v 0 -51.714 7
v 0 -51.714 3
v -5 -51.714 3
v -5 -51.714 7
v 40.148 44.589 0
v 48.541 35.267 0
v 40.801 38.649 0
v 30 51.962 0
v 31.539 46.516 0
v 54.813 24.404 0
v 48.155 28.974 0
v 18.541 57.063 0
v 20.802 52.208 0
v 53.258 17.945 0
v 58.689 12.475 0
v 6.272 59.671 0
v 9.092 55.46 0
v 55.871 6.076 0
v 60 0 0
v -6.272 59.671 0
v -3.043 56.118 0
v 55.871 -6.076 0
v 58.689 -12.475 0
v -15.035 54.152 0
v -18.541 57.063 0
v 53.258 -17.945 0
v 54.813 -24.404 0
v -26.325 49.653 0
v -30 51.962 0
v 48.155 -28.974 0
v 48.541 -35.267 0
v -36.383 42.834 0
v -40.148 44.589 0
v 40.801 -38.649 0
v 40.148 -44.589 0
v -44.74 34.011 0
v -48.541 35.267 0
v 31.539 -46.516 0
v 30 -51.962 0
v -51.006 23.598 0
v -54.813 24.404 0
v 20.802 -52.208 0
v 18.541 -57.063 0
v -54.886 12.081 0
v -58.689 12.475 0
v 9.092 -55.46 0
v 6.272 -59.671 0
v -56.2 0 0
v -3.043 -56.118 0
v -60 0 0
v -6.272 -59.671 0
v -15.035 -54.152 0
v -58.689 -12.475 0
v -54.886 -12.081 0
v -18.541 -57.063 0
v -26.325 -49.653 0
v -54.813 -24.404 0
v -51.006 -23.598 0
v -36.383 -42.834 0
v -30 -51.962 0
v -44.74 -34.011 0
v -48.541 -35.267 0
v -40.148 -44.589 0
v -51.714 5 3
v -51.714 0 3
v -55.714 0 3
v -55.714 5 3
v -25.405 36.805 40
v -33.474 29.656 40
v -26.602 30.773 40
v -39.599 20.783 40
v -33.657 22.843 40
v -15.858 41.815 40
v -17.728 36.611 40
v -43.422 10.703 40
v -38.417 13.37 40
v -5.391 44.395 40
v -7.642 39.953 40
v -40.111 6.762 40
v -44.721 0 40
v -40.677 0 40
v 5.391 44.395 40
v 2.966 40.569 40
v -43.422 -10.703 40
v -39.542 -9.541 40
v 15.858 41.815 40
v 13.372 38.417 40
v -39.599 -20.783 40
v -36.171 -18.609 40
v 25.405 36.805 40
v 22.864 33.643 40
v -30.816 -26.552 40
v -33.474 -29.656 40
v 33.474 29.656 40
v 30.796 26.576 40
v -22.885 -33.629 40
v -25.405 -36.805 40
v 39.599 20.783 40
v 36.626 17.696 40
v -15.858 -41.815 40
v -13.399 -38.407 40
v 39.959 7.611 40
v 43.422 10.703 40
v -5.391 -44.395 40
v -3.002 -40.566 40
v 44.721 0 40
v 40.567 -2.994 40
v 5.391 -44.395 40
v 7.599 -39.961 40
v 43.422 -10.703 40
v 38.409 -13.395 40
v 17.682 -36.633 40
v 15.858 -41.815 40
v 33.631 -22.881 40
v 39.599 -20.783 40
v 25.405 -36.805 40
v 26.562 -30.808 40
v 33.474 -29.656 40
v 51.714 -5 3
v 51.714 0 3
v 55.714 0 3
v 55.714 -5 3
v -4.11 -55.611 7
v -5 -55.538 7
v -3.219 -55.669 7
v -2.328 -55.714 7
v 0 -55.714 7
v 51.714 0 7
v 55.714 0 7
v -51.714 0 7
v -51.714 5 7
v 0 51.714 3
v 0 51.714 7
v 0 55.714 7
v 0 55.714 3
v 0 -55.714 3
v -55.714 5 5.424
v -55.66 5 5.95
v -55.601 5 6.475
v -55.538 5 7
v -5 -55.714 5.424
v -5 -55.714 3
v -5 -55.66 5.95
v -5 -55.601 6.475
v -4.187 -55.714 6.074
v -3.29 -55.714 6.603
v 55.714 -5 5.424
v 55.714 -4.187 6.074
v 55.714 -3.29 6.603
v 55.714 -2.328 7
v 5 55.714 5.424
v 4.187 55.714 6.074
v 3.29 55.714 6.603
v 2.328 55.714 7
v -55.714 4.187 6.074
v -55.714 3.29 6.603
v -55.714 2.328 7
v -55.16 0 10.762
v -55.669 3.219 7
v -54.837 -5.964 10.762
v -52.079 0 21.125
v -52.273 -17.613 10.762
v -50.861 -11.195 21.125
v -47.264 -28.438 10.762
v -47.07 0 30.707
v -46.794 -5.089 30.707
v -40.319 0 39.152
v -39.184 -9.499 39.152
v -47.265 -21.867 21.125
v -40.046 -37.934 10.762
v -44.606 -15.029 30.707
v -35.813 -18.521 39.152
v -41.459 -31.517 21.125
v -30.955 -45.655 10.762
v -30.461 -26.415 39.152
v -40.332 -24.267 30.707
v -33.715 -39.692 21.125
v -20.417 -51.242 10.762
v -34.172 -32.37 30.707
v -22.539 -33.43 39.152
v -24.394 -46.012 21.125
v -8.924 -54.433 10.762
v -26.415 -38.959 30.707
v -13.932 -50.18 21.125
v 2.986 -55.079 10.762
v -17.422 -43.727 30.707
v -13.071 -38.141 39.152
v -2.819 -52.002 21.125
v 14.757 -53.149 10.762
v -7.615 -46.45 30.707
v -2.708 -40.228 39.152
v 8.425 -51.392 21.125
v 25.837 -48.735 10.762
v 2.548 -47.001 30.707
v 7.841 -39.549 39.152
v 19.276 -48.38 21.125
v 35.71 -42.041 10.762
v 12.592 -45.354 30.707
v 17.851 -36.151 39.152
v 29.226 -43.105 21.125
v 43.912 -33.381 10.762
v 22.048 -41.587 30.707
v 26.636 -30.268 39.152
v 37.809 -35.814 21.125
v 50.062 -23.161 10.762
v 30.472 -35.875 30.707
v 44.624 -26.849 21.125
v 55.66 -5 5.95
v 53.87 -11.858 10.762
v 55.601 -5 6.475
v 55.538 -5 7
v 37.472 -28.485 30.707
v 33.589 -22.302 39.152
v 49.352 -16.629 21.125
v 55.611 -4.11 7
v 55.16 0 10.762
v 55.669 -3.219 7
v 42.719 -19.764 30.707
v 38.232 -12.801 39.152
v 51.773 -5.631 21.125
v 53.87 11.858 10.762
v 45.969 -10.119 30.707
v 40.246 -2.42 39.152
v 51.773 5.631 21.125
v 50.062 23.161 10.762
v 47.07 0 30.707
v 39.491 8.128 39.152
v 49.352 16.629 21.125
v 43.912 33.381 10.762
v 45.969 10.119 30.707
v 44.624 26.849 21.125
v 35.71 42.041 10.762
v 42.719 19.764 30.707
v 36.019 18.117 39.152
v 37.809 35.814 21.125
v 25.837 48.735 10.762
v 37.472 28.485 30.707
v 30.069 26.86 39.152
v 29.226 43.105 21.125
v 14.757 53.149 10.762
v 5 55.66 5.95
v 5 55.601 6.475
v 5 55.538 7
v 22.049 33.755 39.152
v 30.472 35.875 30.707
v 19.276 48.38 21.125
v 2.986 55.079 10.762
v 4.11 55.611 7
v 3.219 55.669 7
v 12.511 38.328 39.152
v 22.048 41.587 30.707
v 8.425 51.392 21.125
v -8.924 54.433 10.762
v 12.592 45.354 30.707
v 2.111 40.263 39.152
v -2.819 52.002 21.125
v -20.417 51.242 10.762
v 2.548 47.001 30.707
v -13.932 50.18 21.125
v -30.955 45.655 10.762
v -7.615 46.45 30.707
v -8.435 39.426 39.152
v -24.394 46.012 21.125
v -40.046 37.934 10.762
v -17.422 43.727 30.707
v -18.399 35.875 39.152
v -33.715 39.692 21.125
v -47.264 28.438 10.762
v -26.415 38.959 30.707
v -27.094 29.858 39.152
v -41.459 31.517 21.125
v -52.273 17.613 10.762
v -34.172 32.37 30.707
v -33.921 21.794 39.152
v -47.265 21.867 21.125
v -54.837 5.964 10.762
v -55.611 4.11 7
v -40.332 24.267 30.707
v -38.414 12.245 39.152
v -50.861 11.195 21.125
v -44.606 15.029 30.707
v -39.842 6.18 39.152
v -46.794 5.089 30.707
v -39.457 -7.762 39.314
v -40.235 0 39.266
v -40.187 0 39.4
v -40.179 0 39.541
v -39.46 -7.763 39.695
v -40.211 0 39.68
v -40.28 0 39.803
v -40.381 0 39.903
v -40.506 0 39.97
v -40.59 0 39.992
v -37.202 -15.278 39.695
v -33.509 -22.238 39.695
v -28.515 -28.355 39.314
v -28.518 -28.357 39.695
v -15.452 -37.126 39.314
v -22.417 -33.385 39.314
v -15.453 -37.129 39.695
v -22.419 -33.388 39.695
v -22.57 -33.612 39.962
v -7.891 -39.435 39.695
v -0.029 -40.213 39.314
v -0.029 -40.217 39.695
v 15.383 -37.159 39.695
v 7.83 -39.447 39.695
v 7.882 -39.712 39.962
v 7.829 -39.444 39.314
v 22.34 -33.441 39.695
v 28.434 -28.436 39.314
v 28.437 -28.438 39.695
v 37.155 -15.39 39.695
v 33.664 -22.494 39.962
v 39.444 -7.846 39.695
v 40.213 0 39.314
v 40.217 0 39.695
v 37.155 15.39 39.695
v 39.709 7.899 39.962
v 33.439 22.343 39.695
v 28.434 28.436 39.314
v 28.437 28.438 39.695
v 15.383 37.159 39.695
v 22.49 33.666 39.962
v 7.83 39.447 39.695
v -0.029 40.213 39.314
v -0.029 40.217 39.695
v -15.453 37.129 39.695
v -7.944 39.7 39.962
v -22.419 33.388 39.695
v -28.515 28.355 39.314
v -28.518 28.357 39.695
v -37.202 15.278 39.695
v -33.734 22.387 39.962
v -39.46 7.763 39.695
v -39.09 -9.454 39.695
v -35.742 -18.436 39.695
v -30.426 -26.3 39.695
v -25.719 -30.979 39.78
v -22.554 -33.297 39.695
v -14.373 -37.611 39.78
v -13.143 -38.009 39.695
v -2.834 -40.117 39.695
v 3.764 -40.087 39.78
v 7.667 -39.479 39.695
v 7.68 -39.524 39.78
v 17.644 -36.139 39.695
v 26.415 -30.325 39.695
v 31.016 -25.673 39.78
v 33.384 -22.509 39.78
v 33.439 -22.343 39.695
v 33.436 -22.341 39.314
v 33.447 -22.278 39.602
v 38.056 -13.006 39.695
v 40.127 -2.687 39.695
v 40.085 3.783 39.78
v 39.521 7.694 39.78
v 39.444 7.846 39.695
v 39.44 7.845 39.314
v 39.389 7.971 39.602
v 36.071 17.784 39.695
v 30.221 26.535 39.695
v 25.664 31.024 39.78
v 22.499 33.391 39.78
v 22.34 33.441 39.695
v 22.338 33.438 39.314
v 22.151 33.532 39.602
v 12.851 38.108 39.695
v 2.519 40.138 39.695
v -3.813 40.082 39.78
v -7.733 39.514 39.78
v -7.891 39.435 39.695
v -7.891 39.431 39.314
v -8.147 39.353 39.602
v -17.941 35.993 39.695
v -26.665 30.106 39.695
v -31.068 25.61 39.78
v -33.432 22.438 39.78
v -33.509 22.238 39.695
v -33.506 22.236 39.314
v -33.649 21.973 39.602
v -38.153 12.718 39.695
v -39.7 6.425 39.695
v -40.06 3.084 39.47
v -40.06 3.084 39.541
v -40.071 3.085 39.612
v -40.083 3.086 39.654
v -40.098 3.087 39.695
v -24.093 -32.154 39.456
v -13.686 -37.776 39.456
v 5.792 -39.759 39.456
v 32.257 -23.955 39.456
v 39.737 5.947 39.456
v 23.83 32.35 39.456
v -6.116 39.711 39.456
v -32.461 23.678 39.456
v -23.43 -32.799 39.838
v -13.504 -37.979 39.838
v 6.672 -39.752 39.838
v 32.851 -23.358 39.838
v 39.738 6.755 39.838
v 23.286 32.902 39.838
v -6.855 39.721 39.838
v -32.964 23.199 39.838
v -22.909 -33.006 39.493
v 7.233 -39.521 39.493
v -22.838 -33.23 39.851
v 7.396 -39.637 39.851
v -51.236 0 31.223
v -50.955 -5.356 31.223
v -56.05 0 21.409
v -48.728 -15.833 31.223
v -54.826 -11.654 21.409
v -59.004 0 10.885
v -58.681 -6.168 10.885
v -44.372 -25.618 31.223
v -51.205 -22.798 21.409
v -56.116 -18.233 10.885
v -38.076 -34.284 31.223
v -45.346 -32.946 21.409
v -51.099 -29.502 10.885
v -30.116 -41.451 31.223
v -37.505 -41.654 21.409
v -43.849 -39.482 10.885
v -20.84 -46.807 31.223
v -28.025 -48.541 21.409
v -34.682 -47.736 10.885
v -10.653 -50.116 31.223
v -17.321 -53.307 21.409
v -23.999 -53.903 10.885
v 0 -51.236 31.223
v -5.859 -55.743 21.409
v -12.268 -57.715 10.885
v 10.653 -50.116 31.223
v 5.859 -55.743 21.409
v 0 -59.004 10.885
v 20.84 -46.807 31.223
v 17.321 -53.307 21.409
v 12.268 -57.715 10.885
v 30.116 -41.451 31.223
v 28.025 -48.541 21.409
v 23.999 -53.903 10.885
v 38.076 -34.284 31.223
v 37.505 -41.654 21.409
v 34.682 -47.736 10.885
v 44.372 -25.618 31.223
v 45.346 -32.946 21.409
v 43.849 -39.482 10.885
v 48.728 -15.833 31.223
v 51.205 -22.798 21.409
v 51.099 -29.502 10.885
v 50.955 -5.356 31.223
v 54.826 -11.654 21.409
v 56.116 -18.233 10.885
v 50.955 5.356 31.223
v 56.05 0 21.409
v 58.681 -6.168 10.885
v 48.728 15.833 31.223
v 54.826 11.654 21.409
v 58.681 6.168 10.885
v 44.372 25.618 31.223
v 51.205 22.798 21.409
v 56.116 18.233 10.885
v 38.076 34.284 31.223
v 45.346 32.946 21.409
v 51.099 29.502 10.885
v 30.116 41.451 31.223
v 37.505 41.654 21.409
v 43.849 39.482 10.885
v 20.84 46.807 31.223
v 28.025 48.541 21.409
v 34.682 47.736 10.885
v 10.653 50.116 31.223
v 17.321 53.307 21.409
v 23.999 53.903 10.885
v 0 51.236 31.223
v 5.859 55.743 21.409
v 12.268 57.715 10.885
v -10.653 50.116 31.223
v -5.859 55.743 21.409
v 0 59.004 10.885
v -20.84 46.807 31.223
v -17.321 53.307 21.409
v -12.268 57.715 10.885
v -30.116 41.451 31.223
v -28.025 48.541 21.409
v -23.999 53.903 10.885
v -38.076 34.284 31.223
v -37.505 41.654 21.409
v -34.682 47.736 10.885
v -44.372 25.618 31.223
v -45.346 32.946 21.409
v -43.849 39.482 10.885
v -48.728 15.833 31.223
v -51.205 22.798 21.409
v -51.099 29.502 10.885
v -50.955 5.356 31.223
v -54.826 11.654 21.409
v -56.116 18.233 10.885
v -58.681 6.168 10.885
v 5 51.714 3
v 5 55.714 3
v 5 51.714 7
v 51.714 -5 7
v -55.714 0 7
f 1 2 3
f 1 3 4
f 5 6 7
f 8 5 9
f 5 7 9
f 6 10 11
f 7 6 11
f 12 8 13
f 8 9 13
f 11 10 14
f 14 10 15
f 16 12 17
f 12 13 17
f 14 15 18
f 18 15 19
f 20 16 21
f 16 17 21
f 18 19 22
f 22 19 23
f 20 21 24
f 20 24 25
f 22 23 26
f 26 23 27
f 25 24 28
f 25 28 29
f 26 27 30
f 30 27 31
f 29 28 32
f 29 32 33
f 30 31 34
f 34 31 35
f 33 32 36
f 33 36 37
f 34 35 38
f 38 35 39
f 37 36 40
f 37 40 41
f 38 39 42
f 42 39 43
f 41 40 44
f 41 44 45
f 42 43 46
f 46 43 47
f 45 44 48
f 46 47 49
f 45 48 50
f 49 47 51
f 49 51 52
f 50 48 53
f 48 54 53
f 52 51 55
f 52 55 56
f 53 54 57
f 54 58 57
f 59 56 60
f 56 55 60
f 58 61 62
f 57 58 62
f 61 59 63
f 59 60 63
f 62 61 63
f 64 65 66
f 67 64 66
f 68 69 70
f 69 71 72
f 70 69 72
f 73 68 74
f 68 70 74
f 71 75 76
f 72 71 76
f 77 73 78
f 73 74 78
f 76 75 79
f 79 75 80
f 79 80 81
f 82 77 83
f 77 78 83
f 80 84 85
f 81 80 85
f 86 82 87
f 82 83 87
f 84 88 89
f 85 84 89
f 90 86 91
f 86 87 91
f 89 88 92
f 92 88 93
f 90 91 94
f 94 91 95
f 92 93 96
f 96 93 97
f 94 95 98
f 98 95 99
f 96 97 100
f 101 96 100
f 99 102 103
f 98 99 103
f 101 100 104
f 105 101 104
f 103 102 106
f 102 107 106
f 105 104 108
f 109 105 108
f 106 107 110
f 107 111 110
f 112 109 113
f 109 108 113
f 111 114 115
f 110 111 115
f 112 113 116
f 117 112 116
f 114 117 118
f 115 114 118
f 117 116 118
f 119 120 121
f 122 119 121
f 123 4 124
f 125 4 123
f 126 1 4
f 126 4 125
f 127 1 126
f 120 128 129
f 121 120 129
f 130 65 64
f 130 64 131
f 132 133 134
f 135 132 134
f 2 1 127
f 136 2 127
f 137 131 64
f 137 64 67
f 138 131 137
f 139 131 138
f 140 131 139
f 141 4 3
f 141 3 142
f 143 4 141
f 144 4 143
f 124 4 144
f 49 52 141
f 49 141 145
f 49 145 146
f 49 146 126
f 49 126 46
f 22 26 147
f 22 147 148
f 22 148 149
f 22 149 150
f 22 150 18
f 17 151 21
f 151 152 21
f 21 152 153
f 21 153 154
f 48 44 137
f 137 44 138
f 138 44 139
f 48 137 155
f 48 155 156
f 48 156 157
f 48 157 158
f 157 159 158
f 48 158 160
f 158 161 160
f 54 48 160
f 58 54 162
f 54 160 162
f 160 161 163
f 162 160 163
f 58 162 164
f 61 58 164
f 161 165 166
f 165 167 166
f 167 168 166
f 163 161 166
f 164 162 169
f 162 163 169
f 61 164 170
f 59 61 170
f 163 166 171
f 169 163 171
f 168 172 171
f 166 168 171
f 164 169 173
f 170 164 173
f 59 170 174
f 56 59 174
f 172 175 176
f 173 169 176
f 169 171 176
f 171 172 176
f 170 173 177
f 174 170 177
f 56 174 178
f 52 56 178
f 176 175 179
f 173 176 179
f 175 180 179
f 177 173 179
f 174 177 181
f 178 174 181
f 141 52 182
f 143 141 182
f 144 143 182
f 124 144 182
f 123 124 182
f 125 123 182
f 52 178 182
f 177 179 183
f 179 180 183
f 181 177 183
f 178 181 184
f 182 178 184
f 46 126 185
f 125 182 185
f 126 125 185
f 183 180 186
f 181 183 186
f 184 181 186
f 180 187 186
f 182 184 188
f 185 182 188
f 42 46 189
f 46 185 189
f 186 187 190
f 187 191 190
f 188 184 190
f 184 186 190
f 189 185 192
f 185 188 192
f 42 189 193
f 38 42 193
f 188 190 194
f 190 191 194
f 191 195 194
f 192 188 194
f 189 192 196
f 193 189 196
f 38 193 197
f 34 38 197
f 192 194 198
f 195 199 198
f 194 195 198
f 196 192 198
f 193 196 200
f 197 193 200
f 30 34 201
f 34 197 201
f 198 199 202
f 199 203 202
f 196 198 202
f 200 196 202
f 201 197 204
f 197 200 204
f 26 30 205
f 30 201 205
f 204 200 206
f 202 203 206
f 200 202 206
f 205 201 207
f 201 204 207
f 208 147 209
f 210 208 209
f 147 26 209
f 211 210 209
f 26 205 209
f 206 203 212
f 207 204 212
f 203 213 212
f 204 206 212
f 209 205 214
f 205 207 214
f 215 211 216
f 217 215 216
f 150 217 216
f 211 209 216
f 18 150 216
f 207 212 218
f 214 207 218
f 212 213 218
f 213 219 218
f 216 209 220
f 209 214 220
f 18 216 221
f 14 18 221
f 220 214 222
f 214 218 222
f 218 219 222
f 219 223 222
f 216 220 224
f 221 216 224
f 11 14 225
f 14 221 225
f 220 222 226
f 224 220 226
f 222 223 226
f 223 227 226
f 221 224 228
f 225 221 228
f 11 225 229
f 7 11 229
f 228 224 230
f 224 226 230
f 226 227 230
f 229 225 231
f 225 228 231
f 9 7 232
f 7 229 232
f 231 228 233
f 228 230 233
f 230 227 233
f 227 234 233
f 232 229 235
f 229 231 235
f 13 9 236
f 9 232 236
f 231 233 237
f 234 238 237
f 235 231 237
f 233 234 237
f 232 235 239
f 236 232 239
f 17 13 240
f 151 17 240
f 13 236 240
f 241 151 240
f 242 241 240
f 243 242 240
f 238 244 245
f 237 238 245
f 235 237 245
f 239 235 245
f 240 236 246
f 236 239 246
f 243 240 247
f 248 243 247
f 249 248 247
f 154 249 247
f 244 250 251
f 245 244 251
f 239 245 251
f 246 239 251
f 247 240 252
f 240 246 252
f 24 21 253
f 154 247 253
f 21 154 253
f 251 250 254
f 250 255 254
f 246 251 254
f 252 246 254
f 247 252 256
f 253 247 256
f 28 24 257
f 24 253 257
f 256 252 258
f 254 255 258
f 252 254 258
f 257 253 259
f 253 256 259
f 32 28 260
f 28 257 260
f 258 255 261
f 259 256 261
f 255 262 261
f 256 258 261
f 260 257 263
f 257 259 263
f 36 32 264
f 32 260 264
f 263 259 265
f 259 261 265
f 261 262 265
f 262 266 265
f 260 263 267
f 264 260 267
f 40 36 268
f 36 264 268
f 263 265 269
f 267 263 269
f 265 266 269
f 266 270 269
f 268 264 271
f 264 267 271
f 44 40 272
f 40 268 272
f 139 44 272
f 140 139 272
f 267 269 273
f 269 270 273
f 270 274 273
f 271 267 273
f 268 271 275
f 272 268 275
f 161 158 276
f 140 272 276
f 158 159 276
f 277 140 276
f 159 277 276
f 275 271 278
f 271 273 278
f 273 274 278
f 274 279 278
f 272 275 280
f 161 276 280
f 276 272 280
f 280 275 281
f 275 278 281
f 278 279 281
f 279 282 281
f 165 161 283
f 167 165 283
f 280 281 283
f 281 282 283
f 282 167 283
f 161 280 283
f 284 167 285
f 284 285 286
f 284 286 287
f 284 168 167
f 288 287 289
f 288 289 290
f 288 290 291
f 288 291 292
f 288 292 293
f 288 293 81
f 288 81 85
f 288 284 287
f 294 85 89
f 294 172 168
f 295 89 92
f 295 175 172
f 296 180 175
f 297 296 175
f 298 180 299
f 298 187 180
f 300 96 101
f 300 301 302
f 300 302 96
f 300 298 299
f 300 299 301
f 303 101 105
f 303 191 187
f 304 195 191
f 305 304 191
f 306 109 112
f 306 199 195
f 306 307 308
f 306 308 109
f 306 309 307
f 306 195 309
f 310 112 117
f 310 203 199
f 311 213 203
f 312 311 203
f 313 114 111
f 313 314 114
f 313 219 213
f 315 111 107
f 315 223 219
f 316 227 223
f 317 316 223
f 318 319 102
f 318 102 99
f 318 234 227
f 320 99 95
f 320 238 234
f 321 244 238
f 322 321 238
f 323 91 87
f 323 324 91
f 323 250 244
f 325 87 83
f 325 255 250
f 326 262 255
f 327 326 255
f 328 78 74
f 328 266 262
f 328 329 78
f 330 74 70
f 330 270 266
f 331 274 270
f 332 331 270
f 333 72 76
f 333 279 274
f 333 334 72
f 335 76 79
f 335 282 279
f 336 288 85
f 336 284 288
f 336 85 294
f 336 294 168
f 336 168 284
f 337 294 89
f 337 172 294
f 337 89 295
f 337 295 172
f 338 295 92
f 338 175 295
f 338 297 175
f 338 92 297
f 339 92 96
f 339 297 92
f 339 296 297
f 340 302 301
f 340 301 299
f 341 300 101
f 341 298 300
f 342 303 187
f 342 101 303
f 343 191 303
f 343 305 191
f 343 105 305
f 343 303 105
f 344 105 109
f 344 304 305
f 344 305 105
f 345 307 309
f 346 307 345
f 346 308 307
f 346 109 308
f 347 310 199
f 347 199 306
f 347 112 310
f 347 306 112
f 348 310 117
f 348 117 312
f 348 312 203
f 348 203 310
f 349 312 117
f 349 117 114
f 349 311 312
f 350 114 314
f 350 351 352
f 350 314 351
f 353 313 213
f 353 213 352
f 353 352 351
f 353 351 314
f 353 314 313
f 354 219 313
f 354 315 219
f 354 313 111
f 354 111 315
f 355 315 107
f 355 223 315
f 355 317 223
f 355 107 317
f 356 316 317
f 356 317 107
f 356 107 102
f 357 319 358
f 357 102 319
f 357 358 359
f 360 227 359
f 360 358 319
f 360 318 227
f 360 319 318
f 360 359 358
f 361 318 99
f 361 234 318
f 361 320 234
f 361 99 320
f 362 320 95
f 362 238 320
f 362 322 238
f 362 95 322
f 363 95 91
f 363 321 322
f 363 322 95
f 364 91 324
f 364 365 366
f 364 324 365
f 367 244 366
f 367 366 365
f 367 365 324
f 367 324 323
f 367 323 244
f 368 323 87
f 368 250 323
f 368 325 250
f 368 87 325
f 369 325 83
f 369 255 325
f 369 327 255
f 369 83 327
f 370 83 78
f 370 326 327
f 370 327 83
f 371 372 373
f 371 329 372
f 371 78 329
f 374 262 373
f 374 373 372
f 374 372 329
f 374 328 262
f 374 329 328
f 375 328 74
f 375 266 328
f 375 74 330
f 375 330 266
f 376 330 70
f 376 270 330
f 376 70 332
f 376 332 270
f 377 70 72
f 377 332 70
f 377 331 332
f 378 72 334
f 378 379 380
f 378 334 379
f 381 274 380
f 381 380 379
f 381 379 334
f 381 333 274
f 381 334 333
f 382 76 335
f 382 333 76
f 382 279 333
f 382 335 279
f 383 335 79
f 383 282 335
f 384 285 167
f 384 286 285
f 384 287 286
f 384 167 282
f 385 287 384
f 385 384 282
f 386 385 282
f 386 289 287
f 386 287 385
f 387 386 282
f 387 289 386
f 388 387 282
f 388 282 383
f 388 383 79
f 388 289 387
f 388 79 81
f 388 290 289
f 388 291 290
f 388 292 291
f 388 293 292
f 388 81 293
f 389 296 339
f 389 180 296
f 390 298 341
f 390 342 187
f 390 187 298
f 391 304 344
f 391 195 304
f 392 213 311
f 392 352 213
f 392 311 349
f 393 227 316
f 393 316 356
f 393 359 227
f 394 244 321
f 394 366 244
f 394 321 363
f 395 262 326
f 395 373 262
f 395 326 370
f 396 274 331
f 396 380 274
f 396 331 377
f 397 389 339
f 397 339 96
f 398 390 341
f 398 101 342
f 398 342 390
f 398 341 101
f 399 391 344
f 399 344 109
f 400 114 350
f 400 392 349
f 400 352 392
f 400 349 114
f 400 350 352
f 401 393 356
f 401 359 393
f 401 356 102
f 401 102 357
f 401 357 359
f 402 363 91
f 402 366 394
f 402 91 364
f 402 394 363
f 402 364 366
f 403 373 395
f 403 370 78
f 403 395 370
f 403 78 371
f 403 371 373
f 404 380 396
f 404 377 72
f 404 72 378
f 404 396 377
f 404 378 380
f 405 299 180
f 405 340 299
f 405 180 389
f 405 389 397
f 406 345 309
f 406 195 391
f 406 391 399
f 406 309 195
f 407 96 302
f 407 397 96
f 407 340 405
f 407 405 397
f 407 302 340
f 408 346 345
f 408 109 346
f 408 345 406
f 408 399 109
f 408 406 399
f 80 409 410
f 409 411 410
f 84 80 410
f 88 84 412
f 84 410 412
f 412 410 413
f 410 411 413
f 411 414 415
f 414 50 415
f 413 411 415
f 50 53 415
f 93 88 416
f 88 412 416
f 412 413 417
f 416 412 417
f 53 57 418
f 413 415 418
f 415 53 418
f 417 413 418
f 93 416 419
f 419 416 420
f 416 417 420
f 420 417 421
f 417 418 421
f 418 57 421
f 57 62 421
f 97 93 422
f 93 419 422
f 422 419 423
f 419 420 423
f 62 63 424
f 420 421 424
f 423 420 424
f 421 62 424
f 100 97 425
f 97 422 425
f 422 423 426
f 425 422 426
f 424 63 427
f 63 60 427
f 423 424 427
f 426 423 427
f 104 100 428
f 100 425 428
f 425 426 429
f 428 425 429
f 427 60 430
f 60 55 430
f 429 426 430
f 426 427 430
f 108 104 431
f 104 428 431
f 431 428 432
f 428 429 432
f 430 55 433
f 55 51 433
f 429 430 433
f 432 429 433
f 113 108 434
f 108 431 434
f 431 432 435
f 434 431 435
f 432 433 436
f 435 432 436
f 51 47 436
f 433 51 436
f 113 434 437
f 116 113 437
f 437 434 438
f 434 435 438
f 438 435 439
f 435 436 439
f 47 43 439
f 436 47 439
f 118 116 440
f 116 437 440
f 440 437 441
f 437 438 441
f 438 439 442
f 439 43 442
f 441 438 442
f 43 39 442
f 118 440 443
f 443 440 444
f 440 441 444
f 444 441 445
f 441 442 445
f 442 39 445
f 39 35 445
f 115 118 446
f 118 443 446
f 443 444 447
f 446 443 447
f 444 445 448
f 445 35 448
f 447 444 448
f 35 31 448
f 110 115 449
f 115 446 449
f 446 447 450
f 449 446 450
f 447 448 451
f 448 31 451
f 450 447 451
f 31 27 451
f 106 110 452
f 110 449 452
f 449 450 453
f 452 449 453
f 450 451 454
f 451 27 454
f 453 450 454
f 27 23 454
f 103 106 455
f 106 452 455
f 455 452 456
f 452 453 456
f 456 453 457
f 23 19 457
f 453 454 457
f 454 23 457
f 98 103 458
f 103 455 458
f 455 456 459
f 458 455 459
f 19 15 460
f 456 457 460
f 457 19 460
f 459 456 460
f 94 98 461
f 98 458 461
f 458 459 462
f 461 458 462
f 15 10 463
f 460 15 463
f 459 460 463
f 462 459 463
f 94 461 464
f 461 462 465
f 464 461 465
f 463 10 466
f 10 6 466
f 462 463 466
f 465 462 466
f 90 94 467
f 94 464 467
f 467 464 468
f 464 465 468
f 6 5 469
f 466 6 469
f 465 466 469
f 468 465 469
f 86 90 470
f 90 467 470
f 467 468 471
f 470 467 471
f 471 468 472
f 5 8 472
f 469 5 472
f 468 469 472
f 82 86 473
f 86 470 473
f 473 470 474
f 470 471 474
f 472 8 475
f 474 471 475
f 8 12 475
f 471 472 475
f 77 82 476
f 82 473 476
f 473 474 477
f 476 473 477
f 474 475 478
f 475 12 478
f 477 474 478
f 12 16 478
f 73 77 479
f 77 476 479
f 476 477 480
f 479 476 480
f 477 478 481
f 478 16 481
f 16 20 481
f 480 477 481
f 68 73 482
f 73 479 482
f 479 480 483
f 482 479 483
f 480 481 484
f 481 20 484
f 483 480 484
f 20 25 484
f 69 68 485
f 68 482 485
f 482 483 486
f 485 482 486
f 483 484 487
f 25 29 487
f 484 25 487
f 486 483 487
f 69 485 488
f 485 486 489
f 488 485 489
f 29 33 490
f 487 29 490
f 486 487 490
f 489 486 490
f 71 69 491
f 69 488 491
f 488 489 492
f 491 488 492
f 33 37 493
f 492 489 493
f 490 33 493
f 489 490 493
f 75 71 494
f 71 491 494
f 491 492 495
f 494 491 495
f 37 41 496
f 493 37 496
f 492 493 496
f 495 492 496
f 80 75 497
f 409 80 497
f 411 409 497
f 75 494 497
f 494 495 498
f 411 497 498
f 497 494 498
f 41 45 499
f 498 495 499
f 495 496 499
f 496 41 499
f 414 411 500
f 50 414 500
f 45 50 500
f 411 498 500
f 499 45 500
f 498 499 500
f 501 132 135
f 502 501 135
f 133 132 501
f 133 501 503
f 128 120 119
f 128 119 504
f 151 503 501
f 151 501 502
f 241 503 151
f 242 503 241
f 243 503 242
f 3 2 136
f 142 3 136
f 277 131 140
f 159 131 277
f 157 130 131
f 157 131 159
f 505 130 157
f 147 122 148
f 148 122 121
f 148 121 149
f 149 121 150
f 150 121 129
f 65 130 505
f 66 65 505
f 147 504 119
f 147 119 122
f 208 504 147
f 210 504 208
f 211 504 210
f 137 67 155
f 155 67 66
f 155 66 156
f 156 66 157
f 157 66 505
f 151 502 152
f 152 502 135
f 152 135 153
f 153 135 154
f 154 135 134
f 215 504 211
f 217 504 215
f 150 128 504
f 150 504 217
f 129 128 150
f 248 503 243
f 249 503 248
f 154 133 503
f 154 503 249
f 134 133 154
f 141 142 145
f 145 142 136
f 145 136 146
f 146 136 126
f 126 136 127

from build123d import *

# Parameters (mm, degrees)
F3_W     = 4
F3_H     = 4
F4_DEPTH = 5
F5_COUNT = 4
F6_R     = 0.5


with BuildPart() as f2:
    # F1 (on Front) → F2 (revolve)
    with BuildSketch(Plane.XZ):
        with BuildLine():
            Line((-39.477081959, 40), (-44.72135955, 40))
            ThreePointArc((-44.72135955, 40), (-56.0503415378, 21.4093253864), (-60, 0))
            Line((-60, 0), (-56.2, 0))
            ThreePointArc((-56.2, 0), (-51.8509980912, 21.6774997855), (-39.477081959, 40))
        make_face()
    revolve(axis=Axis((0, 0, 23.963239044), (0, 0, 1)))

    # F3 (on Right) → F4 (join)
    with BuildSketch(Plane.YZ):
        with Locations((53.7137534916, 5)):
            Rectangle(F3_W, F3_H)
    extrude(amount=F4_DEPTH)

    # F5: F2 ×4 about axis
    f5_axis = Axis((0, 0, 30), (0, 0, 1))


with BuildPart() as f2_1:
    add(f2.part)
    for i in range(1, F5_COUNT):
        add(f2.part.rotate(f5_axis, i * 360 / F5_COUNT))

    # F6
    f6_edges = [f2_1.edges().sort_by_distance(p)[0] for p in [
        (39.477082, 0, 40),
    ]]
    fillet(f6_edges, radius=F6_R)


solid = f2_1.part
